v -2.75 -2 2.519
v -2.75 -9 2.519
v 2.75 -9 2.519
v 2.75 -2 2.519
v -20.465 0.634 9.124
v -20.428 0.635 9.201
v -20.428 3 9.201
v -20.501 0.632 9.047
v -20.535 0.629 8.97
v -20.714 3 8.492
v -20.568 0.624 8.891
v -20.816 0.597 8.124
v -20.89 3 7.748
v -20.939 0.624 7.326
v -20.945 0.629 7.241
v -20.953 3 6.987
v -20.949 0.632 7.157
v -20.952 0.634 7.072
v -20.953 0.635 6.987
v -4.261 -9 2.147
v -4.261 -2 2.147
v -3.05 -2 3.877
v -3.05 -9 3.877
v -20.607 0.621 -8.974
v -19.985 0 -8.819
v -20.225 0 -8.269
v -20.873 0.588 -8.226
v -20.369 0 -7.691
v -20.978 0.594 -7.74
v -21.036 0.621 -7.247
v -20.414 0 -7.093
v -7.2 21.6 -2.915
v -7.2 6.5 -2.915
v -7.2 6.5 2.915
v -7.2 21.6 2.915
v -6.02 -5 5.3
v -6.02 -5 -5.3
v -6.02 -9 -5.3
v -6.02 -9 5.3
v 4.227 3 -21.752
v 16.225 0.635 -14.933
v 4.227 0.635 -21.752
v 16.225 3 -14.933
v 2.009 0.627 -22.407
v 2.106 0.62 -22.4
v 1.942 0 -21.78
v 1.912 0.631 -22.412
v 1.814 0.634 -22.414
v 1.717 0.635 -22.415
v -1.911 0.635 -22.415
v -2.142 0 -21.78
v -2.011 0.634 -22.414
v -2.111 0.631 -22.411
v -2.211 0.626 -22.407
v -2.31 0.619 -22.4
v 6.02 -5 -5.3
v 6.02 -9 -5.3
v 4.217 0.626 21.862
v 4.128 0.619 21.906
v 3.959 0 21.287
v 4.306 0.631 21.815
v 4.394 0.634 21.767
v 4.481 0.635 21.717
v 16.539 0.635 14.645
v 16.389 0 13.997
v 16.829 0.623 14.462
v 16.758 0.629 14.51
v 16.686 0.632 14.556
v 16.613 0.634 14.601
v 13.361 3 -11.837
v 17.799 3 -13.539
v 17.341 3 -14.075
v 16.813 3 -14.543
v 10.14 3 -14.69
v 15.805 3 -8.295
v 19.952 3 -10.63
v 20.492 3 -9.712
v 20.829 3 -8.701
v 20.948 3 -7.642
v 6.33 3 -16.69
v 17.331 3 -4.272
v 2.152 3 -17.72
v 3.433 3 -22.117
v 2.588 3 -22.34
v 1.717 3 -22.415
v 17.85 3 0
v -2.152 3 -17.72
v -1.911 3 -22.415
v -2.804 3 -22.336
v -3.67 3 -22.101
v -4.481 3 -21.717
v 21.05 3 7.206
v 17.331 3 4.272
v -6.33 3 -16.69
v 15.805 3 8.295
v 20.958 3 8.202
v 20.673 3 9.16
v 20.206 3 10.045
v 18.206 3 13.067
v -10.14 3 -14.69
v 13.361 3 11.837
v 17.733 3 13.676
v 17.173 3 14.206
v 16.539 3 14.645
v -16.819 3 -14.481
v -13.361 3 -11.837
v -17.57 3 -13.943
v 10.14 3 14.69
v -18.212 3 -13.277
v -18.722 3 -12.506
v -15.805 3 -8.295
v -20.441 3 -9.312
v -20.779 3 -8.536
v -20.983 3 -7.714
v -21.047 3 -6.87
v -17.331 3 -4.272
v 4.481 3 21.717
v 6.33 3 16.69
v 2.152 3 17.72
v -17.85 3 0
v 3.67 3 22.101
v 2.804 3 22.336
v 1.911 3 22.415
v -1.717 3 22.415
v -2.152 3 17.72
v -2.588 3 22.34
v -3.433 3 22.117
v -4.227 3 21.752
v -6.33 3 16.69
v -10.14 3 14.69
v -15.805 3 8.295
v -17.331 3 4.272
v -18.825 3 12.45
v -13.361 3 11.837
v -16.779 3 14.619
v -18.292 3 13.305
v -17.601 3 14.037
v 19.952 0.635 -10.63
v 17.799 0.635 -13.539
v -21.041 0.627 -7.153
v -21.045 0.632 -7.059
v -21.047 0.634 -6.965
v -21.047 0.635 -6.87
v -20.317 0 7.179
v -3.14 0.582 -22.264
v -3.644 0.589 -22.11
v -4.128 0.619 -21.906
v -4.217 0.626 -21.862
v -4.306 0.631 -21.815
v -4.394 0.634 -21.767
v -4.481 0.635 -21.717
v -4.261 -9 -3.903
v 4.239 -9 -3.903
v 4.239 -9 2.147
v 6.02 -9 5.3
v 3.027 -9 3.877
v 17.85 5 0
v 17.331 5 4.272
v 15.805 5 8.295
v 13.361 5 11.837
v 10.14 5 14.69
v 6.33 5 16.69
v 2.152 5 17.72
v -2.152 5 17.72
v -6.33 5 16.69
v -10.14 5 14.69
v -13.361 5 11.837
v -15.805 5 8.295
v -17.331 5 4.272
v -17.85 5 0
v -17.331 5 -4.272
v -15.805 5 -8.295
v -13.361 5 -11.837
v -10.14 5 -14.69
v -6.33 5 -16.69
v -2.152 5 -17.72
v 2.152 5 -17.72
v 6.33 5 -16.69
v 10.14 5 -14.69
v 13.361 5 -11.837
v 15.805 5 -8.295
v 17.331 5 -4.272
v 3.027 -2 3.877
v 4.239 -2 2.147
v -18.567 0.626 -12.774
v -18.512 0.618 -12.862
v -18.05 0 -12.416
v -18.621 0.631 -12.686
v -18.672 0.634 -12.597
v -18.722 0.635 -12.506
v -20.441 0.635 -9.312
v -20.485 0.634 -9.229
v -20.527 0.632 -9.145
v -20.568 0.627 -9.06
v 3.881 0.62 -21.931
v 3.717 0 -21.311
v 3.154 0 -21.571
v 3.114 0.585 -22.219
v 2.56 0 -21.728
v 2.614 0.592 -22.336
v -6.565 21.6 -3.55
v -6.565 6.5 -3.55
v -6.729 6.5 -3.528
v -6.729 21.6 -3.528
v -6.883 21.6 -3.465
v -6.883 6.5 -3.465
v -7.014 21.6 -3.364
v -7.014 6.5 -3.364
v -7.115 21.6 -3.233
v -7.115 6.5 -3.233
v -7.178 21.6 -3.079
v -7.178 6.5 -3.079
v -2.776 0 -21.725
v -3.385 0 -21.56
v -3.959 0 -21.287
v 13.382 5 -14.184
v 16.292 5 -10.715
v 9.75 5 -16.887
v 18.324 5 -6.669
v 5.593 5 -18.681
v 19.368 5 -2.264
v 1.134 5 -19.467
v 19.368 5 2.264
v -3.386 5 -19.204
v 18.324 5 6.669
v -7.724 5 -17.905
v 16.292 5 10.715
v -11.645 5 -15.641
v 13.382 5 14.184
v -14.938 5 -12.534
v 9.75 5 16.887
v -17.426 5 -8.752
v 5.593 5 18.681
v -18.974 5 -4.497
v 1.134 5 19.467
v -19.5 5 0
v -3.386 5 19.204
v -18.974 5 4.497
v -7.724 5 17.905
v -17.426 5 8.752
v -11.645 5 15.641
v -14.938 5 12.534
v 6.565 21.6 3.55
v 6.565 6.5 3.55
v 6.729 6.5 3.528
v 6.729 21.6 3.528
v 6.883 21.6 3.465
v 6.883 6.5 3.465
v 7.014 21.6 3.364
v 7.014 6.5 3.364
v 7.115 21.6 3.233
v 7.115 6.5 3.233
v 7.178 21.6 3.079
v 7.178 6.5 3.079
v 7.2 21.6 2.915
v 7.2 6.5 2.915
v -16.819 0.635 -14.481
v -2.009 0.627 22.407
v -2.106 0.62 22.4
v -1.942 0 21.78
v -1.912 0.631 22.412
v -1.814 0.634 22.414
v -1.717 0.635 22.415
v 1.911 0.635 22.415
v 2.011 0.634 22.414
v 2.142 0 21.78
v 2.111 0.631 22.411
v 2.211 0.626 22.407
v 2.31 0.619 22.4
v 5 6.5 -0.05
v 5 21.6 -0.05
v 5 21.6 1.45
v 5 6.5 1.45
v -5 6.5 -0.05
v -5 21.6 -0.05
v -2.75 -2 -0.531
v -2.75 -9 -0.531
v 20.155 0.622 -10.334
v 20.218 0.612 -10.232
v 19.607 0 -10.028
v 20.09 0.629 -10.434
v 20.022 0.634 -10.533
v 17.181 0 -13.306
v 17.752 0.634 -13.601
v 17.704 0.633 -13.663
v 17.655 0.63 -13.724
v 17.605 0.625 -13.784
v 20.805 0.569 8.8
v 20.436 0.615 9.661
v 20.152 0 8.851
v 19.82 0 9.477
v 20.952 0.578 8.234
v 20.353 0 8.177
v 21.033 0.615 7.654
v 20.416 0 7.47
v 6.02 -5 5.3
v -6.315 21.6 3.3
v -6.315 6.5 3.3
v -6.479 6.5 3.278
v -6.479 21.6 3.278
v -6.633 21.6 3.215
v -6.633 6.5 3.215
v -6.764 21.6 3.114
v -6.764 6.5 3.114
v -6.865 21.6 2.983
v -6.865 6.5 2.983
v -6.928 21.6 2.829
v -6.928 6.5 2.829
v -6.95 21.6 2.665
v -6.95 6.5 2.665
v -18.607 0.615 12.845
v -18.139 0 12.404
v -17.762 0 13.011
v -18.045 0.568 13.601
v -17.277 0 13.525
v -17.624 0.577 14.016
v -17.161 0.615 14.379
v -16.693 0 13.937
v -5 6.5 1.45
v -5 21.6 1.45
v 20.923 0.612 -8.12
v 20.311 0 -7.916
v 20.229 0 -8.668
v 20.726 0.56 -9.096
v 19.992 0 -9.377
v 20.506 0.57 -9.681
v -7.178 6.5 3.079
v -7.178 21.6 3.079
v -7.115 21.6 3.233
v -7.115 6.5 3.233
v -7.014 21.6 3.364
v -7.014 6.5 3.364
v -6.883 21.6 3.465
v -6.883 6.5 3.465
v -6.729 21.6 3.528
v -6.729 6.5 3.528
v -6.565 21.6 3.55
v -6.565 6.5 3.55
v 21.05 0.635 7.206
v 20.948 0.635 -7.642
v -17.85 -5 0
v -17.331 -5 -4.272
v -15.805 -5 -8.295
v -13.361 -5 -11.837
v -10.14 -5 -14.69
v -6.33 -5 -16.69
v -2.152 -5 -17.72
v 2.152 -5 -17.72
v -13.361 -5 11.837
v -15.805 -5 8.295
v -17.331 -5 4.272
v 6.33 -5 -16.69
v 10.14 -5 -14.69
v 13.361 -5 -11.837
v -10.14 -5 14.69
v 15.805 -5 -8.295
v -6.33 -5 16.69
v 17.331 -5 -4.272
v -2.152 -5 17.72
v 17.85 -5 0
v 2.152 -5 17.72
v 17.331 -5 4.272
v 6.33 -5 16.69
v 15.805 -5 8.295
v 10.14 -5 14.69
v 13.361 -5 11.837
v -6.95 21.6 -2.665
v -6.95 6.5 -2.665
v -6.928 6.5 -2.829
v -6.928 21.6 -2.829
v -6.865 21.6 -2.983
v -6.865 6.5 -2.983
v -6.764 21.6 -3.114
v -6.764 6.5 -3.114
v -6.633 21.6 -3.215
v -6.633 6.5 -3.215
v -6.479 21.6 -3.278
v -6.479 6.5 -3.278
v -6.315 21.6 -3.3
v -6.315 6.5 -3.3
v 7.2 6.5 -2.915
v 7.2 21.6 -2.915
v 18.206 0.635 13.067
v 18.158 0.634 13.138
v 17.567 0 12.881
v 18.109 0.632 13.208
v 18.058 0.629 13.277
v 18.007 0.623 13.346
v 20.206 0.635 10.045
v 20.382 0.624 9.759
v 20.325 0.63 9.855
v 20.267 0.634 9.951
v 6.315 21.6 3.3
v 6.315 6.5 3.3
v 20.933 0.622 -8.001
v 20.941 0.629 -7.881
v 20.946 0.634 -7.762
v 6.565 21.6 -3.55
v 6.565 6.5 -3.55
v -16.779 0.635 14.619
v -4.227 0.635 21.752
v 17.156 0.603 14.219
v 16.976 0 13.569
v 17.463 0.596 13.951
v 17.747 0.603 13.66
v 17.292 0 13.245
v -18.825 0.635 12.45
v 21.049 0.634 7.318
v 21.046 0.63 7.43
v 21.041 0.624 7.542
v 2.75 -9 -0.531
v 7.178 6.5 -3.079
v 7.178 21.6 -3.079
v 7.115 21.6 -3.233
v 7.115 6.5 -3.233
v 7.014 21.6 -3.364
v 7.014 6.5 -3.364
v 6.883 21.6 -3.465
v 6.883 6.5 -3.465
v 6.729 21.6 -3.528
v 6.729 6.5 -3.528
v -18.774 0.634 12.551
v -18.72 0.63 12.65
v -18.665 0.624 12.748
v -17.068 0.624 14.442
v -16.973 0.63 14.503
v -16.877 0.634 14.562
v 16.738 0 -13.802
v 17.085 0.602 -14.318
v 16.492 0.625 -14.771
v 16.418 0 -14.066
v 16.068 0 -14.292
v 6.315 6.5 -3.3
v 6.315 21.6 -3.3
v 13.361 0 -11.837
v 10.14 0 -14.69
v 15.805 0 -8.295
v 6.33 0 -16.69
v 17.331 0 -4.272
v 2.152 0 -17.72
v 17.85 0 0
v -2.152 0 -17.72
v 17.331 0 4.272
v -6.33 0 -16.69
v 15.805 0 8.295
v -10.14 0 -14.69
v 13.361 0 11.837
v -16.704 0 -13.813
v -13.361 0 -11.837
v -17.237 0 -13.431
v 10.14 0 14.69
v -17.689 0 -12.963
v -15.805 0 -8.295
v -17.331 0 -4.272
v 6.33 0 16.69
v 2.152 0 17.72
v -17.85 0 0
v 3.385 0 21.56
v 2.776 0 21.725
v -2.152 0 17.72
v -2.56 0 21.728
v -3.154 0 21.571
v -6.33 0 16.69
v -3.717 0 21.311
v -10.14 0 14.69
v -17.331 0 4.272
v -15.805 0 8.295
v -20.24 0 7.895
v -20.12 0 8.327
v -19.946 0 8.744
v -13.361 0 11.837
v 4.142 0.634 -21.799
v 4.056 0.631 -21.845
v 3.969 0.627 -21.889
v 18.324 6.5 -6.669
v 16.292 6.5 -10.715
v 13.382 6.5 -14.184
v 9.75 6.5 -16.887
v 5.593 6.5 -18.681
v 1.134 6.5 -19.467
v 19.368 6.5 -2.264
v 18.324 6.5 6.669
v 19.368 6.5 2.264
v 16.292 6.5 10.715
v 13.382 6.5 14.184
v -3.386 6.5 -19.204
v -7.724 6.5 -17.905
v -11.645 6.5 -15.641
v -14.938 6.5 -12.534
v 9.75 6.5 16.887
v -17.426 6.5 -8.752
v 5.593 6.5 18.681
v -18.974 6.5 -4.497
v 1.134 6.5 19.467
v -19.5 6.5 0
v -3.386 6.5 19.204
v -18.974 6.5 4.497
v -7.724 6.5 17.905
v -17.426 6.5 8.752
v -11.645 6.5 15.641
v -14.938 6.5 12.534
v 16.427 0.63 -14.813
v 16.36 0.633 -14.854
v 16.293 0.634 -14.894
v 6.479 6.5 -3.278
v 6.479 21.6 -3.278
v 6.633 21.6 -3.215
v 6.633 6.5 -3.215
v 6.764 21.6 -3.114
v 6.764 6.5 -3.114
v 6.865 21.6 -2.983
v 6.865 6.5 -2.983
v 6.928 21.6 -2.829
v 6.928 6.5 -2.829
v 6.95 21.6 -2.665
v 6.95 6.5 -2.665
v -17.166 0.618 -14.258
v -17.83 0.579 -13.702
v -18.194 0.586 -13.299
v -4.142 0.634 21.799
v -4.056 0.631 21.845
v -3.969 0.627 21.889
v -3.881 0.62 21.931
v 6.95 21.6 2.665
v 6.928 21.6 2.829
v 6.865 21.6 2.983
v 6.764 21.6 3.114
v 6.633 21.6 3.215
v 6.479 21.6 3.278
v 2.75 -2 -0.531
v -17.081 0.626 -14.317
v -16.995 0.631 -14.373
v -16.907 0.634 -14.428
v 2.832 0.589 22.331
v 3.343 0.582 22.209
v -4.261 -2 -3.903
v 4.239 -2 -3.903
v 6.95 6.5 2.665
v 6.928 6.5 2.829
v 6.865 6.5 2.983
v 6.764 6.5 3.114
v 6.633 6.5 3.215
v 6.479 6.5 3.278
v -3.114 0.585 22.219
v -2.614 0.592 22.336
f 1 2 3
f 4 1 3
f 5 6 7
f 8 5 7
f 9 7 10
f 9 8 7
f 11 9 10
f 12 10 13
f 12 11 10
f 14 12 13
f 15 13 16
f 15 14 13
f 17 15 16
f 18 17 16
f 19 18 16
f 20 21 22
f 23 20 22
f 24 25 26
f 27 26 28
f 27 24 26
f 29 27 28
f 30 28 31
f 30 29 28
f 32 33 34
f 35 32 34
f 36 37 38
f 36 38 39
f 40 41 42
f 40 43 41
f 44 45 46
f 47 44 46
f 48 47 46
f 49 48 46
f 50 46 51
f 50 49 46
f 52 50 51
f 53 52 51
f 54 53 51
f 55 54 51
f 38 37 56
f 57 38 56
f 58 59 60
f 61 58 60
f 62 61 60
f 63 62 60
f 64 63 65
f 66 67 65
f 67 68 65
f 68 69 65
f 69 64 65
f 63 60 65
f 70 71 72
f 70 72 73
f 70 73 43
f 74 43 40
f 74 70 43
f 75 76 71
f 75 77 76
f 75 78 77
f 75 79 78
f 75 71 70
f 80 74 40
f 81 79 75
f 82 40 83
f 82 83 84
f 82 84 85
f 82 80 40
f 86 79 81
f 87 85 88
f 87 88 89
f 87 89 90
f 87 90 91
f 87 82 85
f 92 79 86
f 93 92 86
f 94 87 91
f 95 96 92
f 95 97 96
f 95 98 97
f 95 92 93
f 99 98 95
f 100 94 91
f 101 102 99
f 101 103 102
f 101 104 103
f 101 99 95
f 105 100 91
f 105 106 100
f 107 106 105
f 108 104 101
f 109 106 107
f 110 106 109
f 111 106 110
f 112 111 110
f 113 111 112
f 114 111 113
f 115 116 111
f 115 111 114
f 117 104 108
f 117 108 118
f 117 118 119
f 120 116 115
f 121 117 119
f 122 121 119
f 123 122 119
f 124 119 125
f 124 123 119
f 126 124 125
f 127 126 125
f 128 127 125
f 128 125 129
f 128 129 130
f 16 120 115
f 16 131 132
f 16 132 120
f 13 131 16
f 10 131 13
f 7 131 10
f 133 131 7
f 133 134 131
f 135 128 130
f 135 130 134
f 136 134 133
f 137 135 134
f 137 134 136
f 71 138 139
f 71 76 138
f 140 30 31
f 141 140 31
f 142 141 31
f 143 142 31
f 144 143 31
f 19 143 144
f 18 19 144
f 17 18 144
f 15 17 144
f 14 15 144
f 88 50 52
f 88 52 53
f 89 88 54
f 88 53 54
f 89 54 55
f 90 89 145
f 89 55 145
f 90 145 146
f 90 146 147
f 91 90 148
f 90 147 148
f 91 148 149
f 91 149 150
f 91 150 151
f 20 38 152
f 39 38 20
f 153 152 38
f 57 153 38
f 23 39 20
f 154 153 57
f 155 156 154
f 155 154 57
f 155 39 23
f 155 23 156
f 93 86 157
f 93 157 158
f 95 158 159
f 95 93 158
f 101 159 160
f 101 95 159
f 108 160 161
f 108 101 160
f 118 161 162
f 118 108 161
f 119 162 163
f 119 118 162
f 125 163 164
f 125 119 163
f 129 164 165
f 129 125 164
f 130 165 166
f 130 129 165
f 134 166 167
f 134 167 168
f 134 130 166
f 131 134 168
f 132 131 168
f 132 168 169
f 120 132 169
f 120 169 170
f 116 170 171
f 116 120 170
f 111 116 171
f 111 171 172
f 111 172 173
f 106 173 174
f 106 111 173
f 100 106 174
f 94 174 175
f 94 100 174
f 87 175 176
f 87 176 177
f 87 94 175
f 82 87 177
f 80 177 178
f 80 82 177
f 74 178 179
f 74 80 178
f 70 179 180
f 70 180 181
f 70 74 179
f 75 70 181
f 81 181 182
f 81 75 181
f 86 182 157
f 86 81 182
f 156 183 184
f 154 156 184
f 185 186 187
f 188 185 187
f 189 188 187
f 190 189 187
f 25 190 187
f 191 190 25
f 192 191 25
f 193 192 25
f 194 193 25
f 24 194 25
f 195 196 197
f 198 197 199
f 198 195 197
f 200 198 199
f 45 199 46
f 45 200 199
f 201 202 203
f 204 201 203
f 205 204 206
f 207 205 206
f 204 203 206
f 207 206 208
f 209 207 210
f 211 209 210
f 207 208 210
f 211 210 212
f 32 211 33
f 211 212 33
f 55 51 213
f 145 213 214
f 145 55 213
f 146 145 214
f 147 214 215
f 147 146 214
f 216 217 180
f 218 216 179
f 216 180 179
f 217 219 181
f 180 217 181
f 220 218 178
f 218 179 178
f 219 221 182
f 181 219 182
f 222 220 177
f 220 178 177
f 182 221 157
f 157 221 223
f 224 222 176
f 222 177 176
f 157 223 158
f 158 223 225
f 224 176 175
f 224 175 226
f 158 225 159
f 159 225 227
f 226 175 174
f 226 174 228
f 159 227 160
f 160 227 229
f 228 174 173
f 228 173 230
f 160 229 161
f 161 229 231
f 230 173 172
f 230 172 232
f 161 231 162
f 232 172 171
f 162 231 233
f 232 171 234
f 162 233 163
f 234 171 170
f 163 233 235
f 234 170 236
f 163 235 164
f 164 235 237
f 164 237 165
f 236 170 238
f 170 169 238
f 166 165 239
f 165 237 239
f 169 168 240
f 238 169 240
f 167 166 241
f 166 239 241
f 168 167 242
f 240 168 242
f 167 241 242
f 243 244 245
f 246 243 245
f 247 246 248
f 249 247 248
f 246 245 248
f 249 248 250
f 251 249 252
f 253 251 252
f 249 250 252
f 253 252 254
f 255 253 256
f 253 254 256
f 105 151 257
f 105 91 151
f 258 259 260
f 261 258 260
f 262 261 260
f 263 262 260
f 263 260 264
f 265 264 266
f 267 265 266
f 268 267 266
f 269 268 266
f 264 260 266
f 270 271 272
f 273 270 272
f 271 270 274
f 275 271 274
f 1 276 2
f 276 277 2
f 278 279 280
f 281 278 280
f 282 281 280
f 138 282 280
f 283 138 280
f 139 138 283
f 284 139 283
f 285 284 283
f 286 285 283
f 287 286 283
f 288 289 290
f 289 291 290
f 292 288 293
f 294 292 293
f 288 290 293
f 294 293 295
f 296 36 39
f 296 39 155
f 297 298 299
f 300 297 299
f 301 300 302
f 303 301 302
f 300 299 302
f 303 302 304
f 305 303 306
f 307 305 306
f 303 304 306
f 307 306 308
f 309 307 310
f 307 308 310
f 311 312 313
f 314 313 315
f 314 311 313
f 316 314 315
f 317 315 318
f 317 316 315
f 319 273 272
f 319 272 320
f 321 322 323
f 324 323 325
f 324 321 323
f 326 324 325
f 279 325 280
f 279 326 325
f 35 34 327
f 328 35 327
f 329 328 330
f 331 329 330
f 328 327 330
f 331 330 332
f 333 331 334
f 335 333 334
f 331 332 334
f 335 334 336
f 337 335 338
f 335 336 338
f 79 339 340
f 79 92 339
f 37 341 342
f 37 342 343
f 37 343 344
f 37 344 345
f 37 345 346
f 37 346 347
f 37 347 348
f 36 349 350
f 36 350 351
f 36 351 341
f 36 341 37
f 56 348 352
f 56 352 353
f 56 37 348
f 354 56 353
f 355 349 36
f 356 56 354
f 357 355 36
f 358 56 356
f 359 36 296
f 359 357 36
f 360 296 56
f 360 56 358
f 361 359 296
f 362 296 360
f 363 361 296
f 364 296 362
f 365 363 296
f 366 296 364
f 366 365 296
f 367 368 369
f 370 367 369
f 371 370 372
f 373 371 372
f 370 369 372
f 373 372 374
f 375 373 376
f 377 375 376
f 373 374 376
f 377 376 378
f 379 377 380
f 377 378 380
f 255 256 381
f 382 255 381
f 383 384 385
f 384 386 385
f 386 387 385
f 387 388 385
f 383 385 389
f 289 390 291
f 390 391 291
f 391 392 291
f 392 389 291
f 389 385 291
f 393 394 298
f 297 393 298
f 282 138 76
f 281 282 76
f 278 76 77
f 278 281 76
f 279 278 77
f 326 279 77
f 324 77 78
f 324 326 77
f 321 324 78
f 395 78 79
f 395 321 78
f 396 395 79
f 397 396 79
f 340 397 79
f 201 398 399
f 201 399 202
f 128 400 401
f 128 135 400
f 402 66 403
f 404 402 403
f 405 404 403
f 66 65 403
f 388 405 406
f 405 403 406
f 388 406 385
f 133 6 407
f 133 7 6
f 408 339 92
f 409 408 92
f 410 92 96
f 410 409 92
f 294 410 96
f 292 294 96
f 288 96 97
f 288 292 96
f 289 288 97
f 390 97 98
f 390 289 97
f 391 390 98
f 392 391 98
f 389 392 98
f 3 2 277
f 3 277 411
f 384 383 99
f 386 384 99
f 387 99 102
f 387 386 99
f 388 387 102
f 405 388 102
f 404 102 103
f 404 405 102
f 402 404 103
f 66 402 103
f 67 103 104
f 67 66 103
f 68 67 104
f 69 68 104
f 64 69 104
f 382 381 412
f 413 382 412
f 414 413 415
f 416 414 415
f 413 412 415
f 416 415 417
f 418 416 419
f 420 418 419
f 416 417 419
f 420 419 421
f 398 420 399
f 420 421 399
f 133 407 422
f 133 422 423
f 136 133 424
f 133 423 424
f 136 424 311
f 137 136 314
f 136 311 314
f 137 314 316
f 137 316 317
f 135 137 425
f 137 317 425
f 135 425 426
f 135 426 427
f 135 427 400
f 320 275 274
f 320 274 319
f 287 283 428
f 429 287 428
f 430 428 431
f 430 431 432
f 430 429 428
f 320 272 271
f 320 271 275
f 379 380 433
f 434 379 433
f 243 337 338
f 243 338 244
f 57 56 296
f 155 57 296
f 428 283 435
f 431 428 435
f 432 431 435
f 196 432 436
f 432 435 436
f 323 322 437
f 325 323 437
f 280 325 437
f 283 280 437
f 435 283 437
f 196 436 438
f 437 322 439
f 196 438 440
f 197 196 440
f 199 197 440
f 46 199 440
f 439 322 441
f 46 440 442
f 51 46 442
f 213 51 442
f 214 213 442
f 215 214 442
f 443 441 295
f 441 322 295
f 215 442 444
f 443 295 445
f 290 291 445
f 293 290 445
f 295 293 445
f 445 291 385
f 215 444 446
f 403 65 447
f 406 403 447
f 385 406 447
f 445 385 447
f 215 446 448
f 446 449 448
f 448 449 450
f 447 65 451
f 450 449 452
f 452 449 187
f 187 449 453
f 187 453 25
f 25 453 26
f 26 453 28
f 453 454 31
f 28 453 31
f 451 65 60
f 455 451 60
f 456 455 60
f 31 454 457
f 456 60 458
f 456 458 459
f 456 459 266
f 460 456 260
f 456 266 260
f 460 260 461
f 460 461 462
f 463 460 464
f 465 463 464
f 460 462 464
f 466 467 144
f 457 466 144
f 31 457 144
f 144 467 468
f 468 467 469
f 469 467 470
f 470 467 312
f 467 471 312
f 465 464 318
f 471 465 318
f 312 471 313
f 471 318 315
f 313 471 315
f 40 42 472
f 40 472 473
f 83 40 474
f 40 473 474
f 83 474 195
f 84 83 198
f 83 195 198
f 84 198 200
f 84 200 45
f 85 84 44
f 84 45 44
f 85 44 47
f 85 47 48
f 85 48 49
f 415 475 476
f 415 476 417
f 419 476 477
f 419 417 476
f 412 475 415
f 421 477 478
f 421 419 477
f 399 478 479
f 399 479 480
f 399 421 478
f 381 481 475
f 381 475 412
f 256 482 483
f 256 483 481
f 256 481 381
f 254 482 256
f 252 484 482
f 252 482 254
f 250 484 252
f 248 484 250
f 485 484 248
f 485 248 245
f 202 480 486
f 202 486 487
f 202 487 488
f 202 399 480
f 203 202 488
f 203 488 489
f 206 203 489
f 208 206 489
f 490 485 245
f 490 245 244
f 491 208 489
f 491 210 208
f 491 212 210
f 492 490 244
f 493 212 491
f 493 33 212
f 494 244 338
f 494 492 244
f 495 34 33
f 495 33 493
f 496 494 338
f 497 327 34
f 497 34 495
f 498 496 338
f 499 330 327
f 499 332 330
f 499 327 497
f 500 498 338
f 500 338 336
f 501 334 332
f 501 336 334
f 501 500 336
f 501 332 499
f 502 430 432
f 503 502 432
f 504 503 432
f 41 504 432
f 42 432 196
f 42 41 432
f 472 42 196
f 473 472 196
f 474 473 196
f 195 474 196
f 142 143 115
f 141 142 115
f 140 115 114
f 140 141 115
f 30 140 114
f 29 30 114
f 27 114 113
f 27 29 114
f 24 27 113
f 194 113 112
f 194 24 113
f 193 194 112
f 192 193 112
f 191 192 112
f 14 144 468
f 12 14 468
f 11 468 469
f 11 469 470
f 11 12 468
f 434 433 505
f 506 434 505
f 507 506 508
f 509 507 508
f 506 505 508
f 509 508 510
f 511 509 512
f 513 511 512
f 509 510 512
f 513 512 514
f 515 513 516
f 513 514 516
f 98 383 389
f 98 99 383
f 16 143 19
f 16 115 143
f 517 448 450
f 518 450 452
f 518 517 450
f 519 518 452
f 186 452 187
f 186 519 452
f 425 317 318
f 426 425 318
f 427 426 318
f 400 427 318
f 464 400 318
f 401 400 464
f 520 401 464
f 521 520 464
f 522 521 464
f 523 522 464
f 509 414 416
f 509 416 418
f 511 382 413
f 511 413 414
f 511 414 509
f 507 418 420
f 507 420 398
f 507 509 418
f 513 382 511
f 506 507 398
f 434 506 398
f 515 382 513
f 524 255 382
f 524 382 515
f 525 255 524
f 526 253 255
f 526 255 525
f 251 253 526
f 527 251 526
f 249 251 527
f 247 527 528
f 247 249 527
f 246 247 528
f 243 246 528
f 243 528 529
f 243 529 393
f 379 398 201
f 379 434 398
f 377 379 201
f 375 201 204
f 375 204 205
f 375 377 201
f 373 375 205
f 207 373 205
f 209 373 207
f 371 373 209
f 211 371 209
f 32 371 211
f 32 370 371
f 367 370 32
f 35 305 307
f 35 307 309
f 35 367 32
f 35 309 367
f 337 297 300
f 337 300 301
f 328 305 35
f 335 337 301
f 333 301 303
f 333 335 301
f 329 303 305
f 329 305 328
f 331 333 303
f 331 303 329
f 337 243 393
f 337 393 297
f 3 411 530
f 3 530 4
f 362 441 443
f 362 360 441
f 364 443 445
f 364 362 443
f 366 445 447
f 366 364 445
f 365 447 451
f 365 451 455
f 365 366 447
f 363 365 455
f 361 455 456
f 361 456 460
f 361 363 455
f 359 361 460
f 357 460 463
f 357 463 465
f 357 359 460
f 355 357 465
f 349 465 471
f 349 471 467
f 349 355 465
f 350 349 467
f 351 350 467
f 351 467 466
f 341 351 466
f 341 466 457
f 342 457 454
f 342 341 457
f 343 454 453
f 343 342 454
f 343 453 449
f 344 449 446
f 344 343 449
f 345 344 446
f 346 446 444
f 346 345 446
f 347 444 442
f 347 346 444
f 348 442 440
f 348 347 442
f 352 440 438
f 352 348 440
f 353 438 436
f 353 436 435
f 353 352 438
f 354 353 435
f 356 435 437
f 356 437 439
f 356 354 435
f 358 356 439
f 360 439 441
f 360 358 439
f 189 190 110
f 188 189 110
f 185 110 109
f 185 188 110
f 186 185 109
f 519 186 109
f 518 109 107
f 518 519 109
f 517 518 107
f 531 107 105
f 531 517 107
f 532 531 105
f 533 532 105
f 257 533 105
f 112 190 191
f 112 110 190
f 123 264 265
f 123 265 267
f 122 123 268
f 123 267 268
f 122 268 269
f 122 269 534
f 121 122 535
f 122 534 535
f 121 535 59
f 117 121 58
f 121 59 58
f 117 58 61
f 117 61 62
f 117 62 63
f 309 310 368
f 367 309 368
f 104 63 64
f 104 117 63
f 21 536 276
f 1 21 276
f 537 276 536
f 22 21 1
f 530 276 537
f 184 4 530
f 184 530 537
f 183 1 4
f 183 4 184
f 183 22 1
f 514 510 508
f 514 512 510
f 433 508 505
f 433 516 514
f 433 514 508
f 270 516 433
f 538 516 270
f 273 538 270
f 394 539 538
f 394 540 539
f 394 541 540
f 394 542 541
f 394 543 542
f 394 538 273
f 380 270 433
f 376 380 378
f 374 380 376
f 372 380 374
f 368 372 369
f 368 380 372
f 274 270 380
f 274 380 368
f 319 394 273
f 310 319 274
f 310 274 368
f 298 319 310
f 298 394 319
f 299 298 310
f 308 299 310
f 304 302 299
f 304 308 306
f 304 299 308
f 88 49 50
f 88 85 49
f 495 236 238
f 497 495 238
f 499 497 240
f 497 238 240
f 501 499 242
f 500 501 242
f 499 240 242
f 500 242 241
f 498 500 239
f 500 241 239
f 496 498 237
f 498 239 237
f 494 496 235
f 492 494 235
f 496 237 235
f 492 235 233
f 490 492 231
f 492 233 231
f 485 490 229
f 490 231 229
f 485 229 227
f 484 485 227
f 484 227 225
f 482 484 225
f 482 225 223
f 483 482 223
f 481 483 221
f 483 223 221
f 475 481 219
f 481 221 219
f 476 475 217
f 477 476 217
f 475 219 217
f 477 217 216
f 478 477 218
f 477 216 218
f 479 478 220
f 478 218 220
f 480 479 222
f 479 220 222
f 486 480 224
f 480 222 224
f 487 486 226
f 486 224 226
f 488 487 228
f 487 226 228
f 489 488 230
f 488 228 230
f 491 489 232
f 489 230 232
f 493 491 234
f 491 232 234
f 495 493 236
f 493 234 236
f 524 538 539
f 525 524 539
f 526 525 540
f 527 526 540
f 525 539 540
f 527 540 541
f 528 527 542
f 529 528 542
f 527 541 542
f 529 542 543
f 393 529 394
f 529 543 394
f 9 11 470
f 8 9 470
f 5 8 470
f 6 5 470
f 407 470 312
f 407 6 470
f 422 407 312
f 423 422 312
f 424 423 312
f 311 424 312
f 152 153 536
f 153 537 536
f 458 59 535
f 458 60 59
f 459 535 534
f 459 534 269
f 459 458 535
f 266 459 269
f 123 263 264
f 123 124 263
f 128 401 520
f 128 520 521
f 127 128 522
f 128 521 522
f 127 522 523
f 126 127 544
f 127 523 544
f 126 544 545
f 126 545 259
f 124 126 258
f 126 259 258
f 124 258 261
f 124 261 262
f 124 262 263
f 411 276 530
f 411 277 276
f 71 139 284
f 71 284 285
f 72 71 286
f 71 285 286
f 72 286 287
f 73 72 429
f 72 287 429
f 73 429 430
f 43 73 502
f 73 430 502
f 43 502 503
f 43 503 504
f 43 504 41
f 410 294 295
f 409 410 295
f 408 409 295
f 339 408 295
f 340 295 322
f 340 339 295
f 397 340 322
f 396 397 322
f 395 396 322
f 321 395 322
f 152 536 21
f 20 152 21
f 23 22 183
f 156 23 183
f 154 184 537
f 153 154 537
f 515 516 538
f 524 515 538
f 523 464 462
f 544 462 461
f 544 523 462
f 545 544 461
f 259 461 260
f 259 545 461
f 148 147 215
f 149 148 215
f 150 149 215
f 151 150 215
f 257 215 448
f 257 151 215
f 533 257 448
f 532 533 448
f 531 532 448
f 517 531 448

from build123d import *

# Parameters (mm, degrees)
F0_R      = 17.85
F1_DEPTH  = 5
F4_DEPTH  = 3
F5_SIZE   = 0.635
F6_F1_R   = 5.08
F6_F2_R   = 5.08
F6_F3_R   = 5.08
F6_F4_R   = 5.08
F6_F5_R   = 5.08
F6_F6_R   = 5.08
F6_F7_R   = 5.08
F6_F8_R   = 5.08
F6_F9_R   = 5.08
F6_F10_R  = 5.08
F6_F11_R  = 5.08
F6_F12_R  = 5.08
F6_F13_R  = 5.08
F6_F14_R  = 5.08
F6_F15_R  = 5.08
F6_F16_R  = 5.08
F6_F17_R  = 5.08
F6_F18_R  = 5.08
F6_F19_R  = 5.08
F6_F20_R  = 5.08
F6_F21_R  = 5.08
F6_F22_R  = 5.08
F6_F23_R  = 5.08
F6_F24_R  = 5.08
F7_R      = 19.5
F8_DEPTH  = 1.5
F9_W      = 12.04
F9_H      = 10.6
F9_W_2    = 5.5
F9_H_2    = 3.05
F10_DEPTH = 4
F11_DEPTH = 3
F12_W     = 10
F12_H     = 1.5
F13_DEPTH = 15.1


with BuildPart() as f1:
    # F0 (on Front) → F1 (new body, symmetric)
    with BuildSketch(Plane.XZ):
        Circle(F0_R)
    extrude(amount=F1_DEPTH, both=True)

    # F3 (on offset) → F4 (join)
    with BuildSketch(Plane(origin=(0, 3, 0), x_dir=(-1, 0, 0), z_dir=(0, 1, 0))):
        Polygon((-3.2903481497, 22.4154013943), (-17.5555016387, 14.0492031865), (-21.0601798177, 8.7539476816), (-20.9370838593, -9.2984309735), (-17.1594677511, -14.4025583758), (-3.0596518503, -22.4154013943), (3.2903481497, -22.4154013943), (18.0473649217, -13.7607362086), (21.0561899697, -8.1688249226), (20.9448872454, 8.1540418144), (18.1346734923, 13.8483546493), (3.0596518503, 22.4154013943), align=None)
    extrude(amount=-F4_DEPTH)

    # F5
    f5_edges = [f1.edges().sort_by_distance(p)[0] for p in [
        (10.422925, 0, 18.232302),
        (19.307841, 0, 11.401575),
        (20.998632, 0, -0.272242),
        (19.048276, 0, -11.850495),
        (10.10956, 0, -18.40898),
        (-0.115348, 0, -22.415401),
        (-10.668857, 0, -18.088069),
        (-19.551777, 0, -10.964781),
        (-21.000539, 0, -0.007392),
        (-19.53978, 0, 11.001198),
        (-10.597163, 0, 18.131878),
        (0.115348, 0, 22.415401),
    ]]
    chamfer(f5_edges, length=F5_SIZE)

    # F6: fillet of radius 5.08 on 24 edges, made by hand

    # F6_f1
    f6_f1_edges = [f1.edges().sort_by_distance(p)[0] for p in [
        (-20.9448872454, 1.8175, 8.1540418144),
    ]]
    fillet(f6_f1_edges, radius=F6_F1_R)

    # F6_f2
    f6_f2_edges = [f1.edges().sort_by_distance(p)[0] for p in [
        (-18.1346734923, 1.8175, 13.8483546493),
    ]]
    fillet(f6_f2_edges, radius=F6_F2_R)

    # F6_f3
    f6_f3_edges = [f1.edges().sort_by_distance(p)[0] for p in [
        (-21.0561899697, 1.8175, -8.1688249226),
    ]]
    fillet(f6_f3_edges, radius=F6_F3_R)

    # F6_f4
    f6_f4_edges = [f1.edges().sort_by_distance(p)[0] for p in [
        (-20.5635101748, 0.2530156874, 8.0636856851),
    ]]
    fillet(f6_f4_edges, radius=F6_F4_R)

    # F6_f5
    f6_f5_edges = [f1.edges().sort_by_distance(p)[0] for p in [
        (-17.80801976, 0.205710524, 13.540221636),
    ]]
    fillet(f6_f5_edges, radius=F6_F5_R)

    # F6_f6
    f6_f6_edges = [f1.edges().sort_by_distance(p)[0] for p in [
        (-3.0596518503, 1.8175, 22.4154013943),
    ]]
    fillet(f6_f6_edges, radius=F6_F6_R)

    # F6_f7
    f6_f7_edges = [f1.edges().sort_by_distance(p)[0] for p in [
        (-18.0473649217, 1.8175, -13.7607362086),
    ]]
    fillet(f6_f7_edges, radius=F6_F7_R)

    # F6_f8
    f6_f8_edges = [f1.edges().sort_by_distance(p)[0] for p in [
        (-20.6589027008, 0.2383946915, -8.0701656315),
    ]]
    fillet(f6_f8_edges, radius=F6_F8_R)

    # F6_f9
    f6_f9_edges = [f1.edges().sort_by_distance(p)[0] for p in [
        (-2.9534511203, 0.2331786487, 22.013580043),
    ]]
    fillet(f6_f9_edges, radius=F6_F9_R)

    # F6_f10
    f6_f10_edges = [f1.edges().sort_by_distance(p)[0] for p in [
        (3.2903481497, 1.8175, 22.4154013943),
    ]]
    fillet(f6_f10_edges, radius=F6_F10_R)

    # F6_f11
    f6_f11_edges = [f1.edges().sort_by_distance(p)[0] for p in [
        (-3.2903481497, 1.8175, -22.4154013943),
    ]]
    fillet(f6_f11_edges, radius=F6_F11_R)

    # F6_f12
    f6_f12_edges = [f1.edges().sort_by_distance(p)[0] for p in [
        (17.5555016387, 1.8175, 14.0492031865),
    ]]
    fillet(f6_f12_edges, radius=F6_F12_R)

    # F6_f13
    f6_f13_edges = [f1.edges().sort_by_distance(p)[0] for p in [
        (3.0596518503, 1.8175, -22.4154013943),
    ]]
    fillet(f6_f13_edges, radius=F6_F13_R)

    # F6_f14
    f6_f14_edges = [f1.edges().sort_by_distance(p)[0] for p in [
        (21.0601798177, 1.8175, 8.7539476816),
    ]]
    fillet(f6_f14_edges, radius=F6_F14_R)

    # F6_f15
    f6_f15_edges = [f1.edges().sort_by_distance(p)[0] for p in [
        (17.1594677511, 1.8175, -14.4025583758),
    ]]
    fillet(f6_f15_edges, radius=F6_F15_R)

    # F6_f16
    f6_f16_edges = [f1.edges().sort_by_distance(p)[0] for p in [
        (20.9370838593, 1.8175, -9.2984309735),
    ]]
    fillet(f6_f16_edges, radius=F6_F16_R)

    # F6_f17
    f6_f17_edges = [f1.edges().sort_by_distance(p)[0] for p in [
        (-17.7394232188, 0.2231799565, -13.4639178232),
    ]]
    fillet(f6_f17_edges, radius=F6_F17_R)

    # F6_f18
    f6_f18_edges = [f1.edges().sort_by_distance(p)[0] for p in [
        (3.1799932747, 0.2286960306, 22.009097425),
    ]]
    fillet(f6_f18_edges, radius=F6_F18_R)

    # F6_f19
    f6_f19_edges = [f1.edges().sort_by_distance(p)[0] for p in [
        (17.2850276, 0.2518471741, 13.7636444987),
    ]]
    fillet(f6_f19_edges, radius=F6_F19_R)

    # F6_f20
    f6_f20_edges = [f1.edges().sort_by_distance(p)[0] for p in [
        (20.6315309968, 0.2072299177, 8.6265365553),
    ]]
    fillet(f6_f20_edges, radius=F6_F20_R)

    # F6_f21
    f6_f21_edges = [f1.edges().sort_by_distance(p)[0] for p in [
        (20.4954738766, 0.1923957856, -9.1511150124),
    ]]
    fillet(f6_f21_edges, radius=F6_F21_R)

    # F6_f22
    f6_f22_edges = [f1.edges().sort_by_distance(p)[0] for p in [
        (16.9069384559, 0.262522864, -14.1176463871),
    ]]
    fillet(f6_f22_edges, radius=F6_F22_R)

    # F6_f23
    f6_f23_edges = [f1.edges().sort_by_distance(p)[0] for p in [
        (2.9534511203, 0.2331786487, -22.013580043),
    ]]
    fillet(f6_f23_edges, radius=F6_F23_R)

    # F6_f24
    f6_f24_edges = [f1.edges().sort_by_distance(p)[0] for p in [
        (-3.1799932747, 0.2286960306, -22.009097425),
    ]]
    fillet(f6_f24_edges, radius=F6_F24_R)

    # F7 (on face) → F8 (join)
    with BuildSketch(Plane(origin=(0, 5, 0), x_dir=(-1, 0, 0), z_dir=(0, 1, 0))):
        Circle(F7_R)
    extrude(amount=F8_DEPTH)

    # F9 (on face) → F10 (join)
    with BuildSketch(Plane.XZ.offset(5)):
        Rectangle(F9_W, F9_H)
        Polygon((4.2387, -3.903), (-4.2613, -3.903), (-4.2613, 2.1469455678), (-3.0499028451, 3.877), (3.0273028451, 3.877), (4.2387, 2.1469455678), align=None, mode=Mode.SUBTRACT)
        with Locations((0, 0.9936958086)):
            Rectangle(F9_W_2, F9_H_2)
    extrude(amount=F10_DEPTH)

    # F9 (on face) → F11 (cut)
    with BuildSketch(Plane.XZ.offset(5)):
        Polygon((-4.2613, 2.1469455678), (-4.2613, -3.903), (4.2387, -3.903), (4.2387, 2.1469455678), (3.0273028451, 3.877), (-3.0499028451, 3.877), align=None)
        with Locations((0, 0.9936958086)):
            Rectangle(F9_W_2, F9_H_2, mode=Mode.SUBTRACT)
    extrude(amount=-F11_DEPTH, mode=Mode.SUBTRACT)

    # F12 (on face) → F13 (join)
    with BuildSketch(Plane(origin=(0, 6.5, 0), x_dir=(-1, 0, 0), z_dir=(0, 1, 0))):
        with BuildLine():
            Line((6.565, 3.55), (-6.565, 3.55))
            ThreePointArc((-6.565, 3.55), (-7.0140128061, 3.3640128061), (-7.2, 2.915))
            Line((-7.2, 2.915), (-7.2, -2.915))
            ThreePointArc((-7.2, -2.915), (-7.0140128061, -3.3640128061), (-6.565, -3.55))
            Line((-6.565, -3.55), (6.565, -3.55))
            ThreePointArc((6.565, -3.55), (7.0140128061, -3.3640128061), (7.2, -2.915))
            Line((7.2, -2.915), (7.2, 2.915))
            ThreePointArc((7.2, 2.915), (7.0140128061, 3.3640128061), (6.565, 3.55))
        make_face()
        with BuildLine():
            ThreePointArc((-6.95, 2.665), (-6.7640128061, 3.1140128061), (-6.315, 3.3))
            Line((-6.315, 3.3), (6.315, 3.3))
            ThreePointArc((6.315, 3.3), (6.7640128061, 3.1140128061), (6.95, 2.665))
            Line((6.95, 2.665), (6.95, -2.665))
            ThreePointArc((6.95, -2.665), (6.7640128061, -3.1140128061), (6.315, -3.3))
            Line((6.315, -3.3), (-6.315, -3.3))
            ThreePointArc((-6.315, -3.3), (-6.7640128061, -3.1140128061), (-6.95, -2.665))
            Line((-6.95, -2.665), (-6.95, 2.665))
        make_face(mode=Mode.SUBTRACT)
        with Locations((0, 0.7)):
            Rectangle(F12_W, F12_H)
    extrude(amount=F13_DEPTH)


solid = f1.part
